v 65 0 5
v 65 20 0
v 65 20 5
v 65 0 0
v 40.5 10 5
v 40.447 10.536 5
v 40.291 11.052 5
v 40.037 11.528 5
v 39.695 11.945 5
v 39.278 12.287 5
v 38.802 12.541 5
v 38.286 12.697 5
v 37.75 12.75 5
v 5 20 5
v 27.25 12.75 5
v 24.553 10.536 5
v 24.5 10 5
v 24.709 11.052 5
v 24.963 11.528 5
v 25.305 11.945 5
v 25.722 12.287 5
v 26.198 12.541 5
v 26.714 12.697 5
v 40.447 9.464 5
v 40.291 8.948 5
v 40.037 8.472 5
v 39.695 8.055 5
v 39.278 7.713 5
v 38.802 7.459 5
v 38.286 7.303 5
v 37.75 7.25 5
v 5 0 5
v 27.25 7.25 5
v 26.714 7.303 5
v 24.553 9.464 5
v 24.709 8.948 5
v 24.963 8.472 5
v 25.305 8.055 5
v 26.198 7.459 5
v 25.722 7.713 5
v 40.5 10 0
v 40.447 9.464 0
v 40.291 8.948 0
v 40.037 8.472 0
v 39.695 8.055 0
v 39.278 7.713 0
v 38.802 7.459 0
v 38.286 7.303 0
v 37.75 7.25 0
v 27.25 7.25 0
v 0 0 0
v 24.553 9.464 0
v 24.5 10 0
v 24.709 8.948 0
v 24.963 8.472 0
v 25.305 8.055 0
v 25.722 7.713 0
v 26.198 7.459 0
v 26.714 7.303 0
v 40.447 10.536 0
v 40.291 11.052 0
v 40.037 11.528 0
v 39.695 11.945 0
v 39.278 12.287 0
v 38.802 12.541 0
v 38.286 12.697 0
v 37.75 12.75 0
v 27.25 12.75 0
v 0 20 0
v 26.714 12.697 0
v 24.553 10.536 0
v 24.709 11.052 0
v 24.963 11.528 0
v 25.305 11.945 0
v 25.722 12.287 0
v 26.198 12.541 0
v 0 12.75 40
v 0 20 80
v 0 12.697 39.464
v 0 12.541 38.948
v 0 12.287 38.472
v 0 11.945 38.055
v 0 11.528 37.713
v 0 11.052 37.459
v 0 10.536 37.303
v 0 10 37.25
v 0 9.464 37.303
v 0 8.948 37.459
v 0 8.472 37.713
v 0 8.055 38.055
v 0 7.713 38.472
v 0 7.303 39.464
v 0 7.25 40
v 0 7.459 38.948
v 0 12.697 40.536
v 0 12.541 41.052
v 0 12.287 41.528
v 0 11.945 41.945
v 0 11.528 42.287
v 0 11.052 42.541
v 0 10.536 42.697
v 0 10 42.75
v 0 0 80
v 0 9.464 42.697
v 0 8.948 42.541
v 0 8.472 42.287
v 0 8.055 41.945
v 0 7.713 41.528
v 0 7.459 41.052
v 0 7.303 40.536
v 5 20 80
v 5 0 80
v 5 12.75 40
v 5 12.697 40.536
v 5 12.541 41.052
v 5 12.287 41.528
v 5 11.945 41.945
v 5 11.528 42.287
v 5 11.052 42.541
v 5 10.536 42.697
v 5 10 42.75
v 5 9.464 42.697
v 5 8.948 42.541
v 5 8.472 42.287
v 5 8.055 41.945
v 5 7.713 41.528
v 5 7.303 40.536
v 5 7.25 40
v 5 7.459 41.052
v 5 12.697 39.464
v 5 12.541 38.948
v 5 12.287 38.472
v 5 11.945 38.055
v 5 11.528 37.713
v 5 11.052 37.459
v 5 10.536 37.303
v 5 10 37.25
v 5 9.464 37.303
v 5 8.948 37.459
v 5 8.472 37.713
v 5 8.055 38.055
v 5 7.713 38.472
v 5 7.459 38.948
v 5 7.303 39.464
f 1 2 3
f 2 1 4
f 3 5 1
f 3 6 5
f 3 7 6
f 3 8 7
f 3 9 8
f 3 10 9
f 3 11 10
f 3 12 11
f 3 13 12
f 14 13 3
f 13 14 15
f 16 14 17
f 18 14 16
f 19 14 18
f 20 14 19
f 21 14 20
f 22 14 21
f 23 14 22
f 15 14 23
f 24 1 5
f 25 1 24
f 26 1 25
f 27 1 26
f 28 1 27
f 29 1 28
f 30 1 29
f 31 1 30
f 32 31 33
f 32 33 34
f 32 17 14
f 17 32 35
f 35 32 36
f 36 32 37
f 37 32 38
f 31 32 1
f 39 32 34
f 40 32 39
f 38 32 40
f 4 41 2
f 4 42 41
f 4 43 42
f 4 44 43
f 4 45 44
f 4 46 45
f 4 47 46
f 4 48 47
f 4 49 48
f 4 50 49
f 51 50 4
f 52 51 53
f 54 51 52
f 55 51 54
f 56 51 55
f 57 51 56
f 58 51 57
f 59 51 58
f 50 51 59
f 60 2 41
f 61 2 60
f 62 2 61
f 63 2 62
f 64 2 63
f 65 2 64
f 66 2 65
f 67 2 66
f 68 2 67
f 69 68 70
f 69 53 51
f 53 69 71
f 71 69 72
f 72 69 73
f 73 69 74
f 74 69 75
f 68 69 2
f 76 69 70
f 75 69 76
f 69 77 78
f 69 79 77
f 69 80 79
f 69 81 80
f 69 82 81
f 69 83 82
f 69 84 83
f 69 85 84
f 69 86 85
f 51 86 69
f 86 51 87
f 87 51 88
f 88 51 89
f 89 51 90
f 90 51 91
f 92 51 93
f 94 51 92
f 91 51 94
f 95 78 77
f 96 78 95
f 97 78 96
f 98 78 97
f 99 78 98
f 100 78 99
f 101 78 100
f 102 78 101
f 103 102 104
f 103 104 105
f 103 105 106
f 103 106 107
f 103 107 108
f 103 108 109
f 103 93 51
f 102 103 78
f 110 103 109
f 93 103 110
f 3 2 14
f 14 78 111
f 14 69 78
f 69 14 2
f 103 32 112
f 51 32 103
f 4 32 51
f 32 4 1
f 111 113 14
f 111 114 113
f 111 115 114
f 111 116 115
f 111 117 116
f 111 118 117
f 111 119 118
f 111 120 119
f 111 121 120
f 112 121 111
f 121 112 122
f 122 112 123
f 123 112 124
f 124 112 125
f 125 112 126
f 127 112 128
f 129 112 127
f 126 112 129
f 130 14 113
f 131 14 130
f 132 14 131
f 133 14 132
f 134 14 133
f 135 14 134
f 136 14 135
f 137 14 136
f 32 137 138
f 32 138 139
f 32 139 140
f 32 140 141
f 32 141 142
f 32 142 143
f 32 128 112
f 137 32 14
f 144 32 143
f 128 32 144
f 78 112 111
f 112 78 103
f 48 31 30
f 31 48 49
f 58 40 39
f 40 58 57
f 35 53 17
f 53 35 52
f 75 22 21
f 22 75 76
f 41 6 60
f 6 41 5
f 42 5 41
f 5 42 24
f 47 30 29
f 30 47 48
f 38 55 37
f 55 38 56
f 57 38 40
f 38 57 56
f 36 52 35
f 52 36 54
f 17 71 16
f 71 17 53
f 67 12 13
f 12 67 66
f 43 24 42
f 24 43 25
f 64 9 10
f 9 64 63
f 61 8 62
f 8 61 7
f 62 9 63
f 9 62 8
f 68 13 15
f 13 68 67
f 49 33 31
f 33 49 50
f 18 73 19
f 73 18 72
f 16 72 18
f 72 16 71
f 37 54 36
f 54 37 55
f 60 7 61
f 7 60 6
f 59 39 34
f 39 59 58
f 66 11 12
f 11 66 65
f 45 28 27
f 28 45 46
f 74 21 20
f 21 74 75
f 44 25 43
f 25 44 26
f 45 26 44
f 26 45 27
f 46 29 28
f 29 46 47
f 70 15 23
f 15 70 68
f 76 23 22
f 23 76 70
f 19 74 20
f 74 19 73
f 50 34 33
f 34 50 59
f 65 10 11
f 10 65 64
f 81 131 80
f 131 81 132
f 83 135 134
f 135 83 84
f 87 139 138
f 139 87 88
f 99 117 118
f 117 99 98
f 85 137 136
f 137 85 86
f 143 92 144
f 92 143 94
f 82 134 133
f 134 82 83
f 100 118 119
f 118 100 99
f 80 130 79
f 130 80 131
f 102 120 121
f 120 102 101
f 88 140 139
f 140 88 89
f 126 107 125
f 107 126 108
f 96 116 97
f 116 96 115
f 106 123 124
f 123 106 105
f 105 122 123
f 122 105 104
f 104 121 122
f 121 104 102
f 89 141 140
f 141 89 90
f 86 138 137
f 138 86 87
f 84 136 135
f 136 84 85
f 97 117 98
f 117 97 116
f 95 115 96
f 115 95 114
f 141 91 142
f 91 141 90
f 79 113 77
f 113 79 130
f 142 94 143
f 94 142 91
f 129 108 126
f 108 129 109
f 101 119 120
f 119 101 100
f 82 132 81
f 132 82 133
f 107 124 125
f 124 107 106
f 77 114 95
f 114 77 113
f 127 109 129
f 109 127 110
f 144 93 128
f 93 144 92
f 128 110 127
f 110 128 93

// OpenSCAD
$fn = 32;

// ----------------------------------------------------------------------
// L-bracket: 65 x 20 x 80 mm
// ----------------------------------------------------------------------

// --- parameters (mm) ---
base_len = 65;            // horizontal leg, X
upright_h = 80;           // vertical leg, Z
flange_w = 20;            // bracket depth, Y
mat_t = 5;                // plate thickness
hole_d = 5.5;             // clearance for M5
slot_l = 16;              // adjustment slot length

module hole_z(px, py) {
  translate([px, py, -2.5]) cylinder(h = mat_t + 5, d = hole_d);
}
module hole_x(pz, py) {
  translate([-2.5, py, pz]) rotate([0, 90, 0]) cylinder(h = mat_t + 5, d = hole_d);
}
module adjust_slot(px, py) {
  hull() {
    translate([px - (slot_l - hole_d) / 2, py, -2.5]) cylinder(h = mat_t + 5, d = hole_d);
    translate([px + (slot_l - hole_d) / 2, py, -2.5]) cylinder(h = mat_t + 5, d = hole_d);
  }
}

difference() {
  union() {
    /* horizontal leg */
    cube([base_len, flange_w, mat_t]);
    /* vertical leg, overlapping the corner block */
    cube([mat_t, flange_w, upright_h]);
  }
  adjust_slot(32.5, 10);
  hole_x(40, 10);
}
